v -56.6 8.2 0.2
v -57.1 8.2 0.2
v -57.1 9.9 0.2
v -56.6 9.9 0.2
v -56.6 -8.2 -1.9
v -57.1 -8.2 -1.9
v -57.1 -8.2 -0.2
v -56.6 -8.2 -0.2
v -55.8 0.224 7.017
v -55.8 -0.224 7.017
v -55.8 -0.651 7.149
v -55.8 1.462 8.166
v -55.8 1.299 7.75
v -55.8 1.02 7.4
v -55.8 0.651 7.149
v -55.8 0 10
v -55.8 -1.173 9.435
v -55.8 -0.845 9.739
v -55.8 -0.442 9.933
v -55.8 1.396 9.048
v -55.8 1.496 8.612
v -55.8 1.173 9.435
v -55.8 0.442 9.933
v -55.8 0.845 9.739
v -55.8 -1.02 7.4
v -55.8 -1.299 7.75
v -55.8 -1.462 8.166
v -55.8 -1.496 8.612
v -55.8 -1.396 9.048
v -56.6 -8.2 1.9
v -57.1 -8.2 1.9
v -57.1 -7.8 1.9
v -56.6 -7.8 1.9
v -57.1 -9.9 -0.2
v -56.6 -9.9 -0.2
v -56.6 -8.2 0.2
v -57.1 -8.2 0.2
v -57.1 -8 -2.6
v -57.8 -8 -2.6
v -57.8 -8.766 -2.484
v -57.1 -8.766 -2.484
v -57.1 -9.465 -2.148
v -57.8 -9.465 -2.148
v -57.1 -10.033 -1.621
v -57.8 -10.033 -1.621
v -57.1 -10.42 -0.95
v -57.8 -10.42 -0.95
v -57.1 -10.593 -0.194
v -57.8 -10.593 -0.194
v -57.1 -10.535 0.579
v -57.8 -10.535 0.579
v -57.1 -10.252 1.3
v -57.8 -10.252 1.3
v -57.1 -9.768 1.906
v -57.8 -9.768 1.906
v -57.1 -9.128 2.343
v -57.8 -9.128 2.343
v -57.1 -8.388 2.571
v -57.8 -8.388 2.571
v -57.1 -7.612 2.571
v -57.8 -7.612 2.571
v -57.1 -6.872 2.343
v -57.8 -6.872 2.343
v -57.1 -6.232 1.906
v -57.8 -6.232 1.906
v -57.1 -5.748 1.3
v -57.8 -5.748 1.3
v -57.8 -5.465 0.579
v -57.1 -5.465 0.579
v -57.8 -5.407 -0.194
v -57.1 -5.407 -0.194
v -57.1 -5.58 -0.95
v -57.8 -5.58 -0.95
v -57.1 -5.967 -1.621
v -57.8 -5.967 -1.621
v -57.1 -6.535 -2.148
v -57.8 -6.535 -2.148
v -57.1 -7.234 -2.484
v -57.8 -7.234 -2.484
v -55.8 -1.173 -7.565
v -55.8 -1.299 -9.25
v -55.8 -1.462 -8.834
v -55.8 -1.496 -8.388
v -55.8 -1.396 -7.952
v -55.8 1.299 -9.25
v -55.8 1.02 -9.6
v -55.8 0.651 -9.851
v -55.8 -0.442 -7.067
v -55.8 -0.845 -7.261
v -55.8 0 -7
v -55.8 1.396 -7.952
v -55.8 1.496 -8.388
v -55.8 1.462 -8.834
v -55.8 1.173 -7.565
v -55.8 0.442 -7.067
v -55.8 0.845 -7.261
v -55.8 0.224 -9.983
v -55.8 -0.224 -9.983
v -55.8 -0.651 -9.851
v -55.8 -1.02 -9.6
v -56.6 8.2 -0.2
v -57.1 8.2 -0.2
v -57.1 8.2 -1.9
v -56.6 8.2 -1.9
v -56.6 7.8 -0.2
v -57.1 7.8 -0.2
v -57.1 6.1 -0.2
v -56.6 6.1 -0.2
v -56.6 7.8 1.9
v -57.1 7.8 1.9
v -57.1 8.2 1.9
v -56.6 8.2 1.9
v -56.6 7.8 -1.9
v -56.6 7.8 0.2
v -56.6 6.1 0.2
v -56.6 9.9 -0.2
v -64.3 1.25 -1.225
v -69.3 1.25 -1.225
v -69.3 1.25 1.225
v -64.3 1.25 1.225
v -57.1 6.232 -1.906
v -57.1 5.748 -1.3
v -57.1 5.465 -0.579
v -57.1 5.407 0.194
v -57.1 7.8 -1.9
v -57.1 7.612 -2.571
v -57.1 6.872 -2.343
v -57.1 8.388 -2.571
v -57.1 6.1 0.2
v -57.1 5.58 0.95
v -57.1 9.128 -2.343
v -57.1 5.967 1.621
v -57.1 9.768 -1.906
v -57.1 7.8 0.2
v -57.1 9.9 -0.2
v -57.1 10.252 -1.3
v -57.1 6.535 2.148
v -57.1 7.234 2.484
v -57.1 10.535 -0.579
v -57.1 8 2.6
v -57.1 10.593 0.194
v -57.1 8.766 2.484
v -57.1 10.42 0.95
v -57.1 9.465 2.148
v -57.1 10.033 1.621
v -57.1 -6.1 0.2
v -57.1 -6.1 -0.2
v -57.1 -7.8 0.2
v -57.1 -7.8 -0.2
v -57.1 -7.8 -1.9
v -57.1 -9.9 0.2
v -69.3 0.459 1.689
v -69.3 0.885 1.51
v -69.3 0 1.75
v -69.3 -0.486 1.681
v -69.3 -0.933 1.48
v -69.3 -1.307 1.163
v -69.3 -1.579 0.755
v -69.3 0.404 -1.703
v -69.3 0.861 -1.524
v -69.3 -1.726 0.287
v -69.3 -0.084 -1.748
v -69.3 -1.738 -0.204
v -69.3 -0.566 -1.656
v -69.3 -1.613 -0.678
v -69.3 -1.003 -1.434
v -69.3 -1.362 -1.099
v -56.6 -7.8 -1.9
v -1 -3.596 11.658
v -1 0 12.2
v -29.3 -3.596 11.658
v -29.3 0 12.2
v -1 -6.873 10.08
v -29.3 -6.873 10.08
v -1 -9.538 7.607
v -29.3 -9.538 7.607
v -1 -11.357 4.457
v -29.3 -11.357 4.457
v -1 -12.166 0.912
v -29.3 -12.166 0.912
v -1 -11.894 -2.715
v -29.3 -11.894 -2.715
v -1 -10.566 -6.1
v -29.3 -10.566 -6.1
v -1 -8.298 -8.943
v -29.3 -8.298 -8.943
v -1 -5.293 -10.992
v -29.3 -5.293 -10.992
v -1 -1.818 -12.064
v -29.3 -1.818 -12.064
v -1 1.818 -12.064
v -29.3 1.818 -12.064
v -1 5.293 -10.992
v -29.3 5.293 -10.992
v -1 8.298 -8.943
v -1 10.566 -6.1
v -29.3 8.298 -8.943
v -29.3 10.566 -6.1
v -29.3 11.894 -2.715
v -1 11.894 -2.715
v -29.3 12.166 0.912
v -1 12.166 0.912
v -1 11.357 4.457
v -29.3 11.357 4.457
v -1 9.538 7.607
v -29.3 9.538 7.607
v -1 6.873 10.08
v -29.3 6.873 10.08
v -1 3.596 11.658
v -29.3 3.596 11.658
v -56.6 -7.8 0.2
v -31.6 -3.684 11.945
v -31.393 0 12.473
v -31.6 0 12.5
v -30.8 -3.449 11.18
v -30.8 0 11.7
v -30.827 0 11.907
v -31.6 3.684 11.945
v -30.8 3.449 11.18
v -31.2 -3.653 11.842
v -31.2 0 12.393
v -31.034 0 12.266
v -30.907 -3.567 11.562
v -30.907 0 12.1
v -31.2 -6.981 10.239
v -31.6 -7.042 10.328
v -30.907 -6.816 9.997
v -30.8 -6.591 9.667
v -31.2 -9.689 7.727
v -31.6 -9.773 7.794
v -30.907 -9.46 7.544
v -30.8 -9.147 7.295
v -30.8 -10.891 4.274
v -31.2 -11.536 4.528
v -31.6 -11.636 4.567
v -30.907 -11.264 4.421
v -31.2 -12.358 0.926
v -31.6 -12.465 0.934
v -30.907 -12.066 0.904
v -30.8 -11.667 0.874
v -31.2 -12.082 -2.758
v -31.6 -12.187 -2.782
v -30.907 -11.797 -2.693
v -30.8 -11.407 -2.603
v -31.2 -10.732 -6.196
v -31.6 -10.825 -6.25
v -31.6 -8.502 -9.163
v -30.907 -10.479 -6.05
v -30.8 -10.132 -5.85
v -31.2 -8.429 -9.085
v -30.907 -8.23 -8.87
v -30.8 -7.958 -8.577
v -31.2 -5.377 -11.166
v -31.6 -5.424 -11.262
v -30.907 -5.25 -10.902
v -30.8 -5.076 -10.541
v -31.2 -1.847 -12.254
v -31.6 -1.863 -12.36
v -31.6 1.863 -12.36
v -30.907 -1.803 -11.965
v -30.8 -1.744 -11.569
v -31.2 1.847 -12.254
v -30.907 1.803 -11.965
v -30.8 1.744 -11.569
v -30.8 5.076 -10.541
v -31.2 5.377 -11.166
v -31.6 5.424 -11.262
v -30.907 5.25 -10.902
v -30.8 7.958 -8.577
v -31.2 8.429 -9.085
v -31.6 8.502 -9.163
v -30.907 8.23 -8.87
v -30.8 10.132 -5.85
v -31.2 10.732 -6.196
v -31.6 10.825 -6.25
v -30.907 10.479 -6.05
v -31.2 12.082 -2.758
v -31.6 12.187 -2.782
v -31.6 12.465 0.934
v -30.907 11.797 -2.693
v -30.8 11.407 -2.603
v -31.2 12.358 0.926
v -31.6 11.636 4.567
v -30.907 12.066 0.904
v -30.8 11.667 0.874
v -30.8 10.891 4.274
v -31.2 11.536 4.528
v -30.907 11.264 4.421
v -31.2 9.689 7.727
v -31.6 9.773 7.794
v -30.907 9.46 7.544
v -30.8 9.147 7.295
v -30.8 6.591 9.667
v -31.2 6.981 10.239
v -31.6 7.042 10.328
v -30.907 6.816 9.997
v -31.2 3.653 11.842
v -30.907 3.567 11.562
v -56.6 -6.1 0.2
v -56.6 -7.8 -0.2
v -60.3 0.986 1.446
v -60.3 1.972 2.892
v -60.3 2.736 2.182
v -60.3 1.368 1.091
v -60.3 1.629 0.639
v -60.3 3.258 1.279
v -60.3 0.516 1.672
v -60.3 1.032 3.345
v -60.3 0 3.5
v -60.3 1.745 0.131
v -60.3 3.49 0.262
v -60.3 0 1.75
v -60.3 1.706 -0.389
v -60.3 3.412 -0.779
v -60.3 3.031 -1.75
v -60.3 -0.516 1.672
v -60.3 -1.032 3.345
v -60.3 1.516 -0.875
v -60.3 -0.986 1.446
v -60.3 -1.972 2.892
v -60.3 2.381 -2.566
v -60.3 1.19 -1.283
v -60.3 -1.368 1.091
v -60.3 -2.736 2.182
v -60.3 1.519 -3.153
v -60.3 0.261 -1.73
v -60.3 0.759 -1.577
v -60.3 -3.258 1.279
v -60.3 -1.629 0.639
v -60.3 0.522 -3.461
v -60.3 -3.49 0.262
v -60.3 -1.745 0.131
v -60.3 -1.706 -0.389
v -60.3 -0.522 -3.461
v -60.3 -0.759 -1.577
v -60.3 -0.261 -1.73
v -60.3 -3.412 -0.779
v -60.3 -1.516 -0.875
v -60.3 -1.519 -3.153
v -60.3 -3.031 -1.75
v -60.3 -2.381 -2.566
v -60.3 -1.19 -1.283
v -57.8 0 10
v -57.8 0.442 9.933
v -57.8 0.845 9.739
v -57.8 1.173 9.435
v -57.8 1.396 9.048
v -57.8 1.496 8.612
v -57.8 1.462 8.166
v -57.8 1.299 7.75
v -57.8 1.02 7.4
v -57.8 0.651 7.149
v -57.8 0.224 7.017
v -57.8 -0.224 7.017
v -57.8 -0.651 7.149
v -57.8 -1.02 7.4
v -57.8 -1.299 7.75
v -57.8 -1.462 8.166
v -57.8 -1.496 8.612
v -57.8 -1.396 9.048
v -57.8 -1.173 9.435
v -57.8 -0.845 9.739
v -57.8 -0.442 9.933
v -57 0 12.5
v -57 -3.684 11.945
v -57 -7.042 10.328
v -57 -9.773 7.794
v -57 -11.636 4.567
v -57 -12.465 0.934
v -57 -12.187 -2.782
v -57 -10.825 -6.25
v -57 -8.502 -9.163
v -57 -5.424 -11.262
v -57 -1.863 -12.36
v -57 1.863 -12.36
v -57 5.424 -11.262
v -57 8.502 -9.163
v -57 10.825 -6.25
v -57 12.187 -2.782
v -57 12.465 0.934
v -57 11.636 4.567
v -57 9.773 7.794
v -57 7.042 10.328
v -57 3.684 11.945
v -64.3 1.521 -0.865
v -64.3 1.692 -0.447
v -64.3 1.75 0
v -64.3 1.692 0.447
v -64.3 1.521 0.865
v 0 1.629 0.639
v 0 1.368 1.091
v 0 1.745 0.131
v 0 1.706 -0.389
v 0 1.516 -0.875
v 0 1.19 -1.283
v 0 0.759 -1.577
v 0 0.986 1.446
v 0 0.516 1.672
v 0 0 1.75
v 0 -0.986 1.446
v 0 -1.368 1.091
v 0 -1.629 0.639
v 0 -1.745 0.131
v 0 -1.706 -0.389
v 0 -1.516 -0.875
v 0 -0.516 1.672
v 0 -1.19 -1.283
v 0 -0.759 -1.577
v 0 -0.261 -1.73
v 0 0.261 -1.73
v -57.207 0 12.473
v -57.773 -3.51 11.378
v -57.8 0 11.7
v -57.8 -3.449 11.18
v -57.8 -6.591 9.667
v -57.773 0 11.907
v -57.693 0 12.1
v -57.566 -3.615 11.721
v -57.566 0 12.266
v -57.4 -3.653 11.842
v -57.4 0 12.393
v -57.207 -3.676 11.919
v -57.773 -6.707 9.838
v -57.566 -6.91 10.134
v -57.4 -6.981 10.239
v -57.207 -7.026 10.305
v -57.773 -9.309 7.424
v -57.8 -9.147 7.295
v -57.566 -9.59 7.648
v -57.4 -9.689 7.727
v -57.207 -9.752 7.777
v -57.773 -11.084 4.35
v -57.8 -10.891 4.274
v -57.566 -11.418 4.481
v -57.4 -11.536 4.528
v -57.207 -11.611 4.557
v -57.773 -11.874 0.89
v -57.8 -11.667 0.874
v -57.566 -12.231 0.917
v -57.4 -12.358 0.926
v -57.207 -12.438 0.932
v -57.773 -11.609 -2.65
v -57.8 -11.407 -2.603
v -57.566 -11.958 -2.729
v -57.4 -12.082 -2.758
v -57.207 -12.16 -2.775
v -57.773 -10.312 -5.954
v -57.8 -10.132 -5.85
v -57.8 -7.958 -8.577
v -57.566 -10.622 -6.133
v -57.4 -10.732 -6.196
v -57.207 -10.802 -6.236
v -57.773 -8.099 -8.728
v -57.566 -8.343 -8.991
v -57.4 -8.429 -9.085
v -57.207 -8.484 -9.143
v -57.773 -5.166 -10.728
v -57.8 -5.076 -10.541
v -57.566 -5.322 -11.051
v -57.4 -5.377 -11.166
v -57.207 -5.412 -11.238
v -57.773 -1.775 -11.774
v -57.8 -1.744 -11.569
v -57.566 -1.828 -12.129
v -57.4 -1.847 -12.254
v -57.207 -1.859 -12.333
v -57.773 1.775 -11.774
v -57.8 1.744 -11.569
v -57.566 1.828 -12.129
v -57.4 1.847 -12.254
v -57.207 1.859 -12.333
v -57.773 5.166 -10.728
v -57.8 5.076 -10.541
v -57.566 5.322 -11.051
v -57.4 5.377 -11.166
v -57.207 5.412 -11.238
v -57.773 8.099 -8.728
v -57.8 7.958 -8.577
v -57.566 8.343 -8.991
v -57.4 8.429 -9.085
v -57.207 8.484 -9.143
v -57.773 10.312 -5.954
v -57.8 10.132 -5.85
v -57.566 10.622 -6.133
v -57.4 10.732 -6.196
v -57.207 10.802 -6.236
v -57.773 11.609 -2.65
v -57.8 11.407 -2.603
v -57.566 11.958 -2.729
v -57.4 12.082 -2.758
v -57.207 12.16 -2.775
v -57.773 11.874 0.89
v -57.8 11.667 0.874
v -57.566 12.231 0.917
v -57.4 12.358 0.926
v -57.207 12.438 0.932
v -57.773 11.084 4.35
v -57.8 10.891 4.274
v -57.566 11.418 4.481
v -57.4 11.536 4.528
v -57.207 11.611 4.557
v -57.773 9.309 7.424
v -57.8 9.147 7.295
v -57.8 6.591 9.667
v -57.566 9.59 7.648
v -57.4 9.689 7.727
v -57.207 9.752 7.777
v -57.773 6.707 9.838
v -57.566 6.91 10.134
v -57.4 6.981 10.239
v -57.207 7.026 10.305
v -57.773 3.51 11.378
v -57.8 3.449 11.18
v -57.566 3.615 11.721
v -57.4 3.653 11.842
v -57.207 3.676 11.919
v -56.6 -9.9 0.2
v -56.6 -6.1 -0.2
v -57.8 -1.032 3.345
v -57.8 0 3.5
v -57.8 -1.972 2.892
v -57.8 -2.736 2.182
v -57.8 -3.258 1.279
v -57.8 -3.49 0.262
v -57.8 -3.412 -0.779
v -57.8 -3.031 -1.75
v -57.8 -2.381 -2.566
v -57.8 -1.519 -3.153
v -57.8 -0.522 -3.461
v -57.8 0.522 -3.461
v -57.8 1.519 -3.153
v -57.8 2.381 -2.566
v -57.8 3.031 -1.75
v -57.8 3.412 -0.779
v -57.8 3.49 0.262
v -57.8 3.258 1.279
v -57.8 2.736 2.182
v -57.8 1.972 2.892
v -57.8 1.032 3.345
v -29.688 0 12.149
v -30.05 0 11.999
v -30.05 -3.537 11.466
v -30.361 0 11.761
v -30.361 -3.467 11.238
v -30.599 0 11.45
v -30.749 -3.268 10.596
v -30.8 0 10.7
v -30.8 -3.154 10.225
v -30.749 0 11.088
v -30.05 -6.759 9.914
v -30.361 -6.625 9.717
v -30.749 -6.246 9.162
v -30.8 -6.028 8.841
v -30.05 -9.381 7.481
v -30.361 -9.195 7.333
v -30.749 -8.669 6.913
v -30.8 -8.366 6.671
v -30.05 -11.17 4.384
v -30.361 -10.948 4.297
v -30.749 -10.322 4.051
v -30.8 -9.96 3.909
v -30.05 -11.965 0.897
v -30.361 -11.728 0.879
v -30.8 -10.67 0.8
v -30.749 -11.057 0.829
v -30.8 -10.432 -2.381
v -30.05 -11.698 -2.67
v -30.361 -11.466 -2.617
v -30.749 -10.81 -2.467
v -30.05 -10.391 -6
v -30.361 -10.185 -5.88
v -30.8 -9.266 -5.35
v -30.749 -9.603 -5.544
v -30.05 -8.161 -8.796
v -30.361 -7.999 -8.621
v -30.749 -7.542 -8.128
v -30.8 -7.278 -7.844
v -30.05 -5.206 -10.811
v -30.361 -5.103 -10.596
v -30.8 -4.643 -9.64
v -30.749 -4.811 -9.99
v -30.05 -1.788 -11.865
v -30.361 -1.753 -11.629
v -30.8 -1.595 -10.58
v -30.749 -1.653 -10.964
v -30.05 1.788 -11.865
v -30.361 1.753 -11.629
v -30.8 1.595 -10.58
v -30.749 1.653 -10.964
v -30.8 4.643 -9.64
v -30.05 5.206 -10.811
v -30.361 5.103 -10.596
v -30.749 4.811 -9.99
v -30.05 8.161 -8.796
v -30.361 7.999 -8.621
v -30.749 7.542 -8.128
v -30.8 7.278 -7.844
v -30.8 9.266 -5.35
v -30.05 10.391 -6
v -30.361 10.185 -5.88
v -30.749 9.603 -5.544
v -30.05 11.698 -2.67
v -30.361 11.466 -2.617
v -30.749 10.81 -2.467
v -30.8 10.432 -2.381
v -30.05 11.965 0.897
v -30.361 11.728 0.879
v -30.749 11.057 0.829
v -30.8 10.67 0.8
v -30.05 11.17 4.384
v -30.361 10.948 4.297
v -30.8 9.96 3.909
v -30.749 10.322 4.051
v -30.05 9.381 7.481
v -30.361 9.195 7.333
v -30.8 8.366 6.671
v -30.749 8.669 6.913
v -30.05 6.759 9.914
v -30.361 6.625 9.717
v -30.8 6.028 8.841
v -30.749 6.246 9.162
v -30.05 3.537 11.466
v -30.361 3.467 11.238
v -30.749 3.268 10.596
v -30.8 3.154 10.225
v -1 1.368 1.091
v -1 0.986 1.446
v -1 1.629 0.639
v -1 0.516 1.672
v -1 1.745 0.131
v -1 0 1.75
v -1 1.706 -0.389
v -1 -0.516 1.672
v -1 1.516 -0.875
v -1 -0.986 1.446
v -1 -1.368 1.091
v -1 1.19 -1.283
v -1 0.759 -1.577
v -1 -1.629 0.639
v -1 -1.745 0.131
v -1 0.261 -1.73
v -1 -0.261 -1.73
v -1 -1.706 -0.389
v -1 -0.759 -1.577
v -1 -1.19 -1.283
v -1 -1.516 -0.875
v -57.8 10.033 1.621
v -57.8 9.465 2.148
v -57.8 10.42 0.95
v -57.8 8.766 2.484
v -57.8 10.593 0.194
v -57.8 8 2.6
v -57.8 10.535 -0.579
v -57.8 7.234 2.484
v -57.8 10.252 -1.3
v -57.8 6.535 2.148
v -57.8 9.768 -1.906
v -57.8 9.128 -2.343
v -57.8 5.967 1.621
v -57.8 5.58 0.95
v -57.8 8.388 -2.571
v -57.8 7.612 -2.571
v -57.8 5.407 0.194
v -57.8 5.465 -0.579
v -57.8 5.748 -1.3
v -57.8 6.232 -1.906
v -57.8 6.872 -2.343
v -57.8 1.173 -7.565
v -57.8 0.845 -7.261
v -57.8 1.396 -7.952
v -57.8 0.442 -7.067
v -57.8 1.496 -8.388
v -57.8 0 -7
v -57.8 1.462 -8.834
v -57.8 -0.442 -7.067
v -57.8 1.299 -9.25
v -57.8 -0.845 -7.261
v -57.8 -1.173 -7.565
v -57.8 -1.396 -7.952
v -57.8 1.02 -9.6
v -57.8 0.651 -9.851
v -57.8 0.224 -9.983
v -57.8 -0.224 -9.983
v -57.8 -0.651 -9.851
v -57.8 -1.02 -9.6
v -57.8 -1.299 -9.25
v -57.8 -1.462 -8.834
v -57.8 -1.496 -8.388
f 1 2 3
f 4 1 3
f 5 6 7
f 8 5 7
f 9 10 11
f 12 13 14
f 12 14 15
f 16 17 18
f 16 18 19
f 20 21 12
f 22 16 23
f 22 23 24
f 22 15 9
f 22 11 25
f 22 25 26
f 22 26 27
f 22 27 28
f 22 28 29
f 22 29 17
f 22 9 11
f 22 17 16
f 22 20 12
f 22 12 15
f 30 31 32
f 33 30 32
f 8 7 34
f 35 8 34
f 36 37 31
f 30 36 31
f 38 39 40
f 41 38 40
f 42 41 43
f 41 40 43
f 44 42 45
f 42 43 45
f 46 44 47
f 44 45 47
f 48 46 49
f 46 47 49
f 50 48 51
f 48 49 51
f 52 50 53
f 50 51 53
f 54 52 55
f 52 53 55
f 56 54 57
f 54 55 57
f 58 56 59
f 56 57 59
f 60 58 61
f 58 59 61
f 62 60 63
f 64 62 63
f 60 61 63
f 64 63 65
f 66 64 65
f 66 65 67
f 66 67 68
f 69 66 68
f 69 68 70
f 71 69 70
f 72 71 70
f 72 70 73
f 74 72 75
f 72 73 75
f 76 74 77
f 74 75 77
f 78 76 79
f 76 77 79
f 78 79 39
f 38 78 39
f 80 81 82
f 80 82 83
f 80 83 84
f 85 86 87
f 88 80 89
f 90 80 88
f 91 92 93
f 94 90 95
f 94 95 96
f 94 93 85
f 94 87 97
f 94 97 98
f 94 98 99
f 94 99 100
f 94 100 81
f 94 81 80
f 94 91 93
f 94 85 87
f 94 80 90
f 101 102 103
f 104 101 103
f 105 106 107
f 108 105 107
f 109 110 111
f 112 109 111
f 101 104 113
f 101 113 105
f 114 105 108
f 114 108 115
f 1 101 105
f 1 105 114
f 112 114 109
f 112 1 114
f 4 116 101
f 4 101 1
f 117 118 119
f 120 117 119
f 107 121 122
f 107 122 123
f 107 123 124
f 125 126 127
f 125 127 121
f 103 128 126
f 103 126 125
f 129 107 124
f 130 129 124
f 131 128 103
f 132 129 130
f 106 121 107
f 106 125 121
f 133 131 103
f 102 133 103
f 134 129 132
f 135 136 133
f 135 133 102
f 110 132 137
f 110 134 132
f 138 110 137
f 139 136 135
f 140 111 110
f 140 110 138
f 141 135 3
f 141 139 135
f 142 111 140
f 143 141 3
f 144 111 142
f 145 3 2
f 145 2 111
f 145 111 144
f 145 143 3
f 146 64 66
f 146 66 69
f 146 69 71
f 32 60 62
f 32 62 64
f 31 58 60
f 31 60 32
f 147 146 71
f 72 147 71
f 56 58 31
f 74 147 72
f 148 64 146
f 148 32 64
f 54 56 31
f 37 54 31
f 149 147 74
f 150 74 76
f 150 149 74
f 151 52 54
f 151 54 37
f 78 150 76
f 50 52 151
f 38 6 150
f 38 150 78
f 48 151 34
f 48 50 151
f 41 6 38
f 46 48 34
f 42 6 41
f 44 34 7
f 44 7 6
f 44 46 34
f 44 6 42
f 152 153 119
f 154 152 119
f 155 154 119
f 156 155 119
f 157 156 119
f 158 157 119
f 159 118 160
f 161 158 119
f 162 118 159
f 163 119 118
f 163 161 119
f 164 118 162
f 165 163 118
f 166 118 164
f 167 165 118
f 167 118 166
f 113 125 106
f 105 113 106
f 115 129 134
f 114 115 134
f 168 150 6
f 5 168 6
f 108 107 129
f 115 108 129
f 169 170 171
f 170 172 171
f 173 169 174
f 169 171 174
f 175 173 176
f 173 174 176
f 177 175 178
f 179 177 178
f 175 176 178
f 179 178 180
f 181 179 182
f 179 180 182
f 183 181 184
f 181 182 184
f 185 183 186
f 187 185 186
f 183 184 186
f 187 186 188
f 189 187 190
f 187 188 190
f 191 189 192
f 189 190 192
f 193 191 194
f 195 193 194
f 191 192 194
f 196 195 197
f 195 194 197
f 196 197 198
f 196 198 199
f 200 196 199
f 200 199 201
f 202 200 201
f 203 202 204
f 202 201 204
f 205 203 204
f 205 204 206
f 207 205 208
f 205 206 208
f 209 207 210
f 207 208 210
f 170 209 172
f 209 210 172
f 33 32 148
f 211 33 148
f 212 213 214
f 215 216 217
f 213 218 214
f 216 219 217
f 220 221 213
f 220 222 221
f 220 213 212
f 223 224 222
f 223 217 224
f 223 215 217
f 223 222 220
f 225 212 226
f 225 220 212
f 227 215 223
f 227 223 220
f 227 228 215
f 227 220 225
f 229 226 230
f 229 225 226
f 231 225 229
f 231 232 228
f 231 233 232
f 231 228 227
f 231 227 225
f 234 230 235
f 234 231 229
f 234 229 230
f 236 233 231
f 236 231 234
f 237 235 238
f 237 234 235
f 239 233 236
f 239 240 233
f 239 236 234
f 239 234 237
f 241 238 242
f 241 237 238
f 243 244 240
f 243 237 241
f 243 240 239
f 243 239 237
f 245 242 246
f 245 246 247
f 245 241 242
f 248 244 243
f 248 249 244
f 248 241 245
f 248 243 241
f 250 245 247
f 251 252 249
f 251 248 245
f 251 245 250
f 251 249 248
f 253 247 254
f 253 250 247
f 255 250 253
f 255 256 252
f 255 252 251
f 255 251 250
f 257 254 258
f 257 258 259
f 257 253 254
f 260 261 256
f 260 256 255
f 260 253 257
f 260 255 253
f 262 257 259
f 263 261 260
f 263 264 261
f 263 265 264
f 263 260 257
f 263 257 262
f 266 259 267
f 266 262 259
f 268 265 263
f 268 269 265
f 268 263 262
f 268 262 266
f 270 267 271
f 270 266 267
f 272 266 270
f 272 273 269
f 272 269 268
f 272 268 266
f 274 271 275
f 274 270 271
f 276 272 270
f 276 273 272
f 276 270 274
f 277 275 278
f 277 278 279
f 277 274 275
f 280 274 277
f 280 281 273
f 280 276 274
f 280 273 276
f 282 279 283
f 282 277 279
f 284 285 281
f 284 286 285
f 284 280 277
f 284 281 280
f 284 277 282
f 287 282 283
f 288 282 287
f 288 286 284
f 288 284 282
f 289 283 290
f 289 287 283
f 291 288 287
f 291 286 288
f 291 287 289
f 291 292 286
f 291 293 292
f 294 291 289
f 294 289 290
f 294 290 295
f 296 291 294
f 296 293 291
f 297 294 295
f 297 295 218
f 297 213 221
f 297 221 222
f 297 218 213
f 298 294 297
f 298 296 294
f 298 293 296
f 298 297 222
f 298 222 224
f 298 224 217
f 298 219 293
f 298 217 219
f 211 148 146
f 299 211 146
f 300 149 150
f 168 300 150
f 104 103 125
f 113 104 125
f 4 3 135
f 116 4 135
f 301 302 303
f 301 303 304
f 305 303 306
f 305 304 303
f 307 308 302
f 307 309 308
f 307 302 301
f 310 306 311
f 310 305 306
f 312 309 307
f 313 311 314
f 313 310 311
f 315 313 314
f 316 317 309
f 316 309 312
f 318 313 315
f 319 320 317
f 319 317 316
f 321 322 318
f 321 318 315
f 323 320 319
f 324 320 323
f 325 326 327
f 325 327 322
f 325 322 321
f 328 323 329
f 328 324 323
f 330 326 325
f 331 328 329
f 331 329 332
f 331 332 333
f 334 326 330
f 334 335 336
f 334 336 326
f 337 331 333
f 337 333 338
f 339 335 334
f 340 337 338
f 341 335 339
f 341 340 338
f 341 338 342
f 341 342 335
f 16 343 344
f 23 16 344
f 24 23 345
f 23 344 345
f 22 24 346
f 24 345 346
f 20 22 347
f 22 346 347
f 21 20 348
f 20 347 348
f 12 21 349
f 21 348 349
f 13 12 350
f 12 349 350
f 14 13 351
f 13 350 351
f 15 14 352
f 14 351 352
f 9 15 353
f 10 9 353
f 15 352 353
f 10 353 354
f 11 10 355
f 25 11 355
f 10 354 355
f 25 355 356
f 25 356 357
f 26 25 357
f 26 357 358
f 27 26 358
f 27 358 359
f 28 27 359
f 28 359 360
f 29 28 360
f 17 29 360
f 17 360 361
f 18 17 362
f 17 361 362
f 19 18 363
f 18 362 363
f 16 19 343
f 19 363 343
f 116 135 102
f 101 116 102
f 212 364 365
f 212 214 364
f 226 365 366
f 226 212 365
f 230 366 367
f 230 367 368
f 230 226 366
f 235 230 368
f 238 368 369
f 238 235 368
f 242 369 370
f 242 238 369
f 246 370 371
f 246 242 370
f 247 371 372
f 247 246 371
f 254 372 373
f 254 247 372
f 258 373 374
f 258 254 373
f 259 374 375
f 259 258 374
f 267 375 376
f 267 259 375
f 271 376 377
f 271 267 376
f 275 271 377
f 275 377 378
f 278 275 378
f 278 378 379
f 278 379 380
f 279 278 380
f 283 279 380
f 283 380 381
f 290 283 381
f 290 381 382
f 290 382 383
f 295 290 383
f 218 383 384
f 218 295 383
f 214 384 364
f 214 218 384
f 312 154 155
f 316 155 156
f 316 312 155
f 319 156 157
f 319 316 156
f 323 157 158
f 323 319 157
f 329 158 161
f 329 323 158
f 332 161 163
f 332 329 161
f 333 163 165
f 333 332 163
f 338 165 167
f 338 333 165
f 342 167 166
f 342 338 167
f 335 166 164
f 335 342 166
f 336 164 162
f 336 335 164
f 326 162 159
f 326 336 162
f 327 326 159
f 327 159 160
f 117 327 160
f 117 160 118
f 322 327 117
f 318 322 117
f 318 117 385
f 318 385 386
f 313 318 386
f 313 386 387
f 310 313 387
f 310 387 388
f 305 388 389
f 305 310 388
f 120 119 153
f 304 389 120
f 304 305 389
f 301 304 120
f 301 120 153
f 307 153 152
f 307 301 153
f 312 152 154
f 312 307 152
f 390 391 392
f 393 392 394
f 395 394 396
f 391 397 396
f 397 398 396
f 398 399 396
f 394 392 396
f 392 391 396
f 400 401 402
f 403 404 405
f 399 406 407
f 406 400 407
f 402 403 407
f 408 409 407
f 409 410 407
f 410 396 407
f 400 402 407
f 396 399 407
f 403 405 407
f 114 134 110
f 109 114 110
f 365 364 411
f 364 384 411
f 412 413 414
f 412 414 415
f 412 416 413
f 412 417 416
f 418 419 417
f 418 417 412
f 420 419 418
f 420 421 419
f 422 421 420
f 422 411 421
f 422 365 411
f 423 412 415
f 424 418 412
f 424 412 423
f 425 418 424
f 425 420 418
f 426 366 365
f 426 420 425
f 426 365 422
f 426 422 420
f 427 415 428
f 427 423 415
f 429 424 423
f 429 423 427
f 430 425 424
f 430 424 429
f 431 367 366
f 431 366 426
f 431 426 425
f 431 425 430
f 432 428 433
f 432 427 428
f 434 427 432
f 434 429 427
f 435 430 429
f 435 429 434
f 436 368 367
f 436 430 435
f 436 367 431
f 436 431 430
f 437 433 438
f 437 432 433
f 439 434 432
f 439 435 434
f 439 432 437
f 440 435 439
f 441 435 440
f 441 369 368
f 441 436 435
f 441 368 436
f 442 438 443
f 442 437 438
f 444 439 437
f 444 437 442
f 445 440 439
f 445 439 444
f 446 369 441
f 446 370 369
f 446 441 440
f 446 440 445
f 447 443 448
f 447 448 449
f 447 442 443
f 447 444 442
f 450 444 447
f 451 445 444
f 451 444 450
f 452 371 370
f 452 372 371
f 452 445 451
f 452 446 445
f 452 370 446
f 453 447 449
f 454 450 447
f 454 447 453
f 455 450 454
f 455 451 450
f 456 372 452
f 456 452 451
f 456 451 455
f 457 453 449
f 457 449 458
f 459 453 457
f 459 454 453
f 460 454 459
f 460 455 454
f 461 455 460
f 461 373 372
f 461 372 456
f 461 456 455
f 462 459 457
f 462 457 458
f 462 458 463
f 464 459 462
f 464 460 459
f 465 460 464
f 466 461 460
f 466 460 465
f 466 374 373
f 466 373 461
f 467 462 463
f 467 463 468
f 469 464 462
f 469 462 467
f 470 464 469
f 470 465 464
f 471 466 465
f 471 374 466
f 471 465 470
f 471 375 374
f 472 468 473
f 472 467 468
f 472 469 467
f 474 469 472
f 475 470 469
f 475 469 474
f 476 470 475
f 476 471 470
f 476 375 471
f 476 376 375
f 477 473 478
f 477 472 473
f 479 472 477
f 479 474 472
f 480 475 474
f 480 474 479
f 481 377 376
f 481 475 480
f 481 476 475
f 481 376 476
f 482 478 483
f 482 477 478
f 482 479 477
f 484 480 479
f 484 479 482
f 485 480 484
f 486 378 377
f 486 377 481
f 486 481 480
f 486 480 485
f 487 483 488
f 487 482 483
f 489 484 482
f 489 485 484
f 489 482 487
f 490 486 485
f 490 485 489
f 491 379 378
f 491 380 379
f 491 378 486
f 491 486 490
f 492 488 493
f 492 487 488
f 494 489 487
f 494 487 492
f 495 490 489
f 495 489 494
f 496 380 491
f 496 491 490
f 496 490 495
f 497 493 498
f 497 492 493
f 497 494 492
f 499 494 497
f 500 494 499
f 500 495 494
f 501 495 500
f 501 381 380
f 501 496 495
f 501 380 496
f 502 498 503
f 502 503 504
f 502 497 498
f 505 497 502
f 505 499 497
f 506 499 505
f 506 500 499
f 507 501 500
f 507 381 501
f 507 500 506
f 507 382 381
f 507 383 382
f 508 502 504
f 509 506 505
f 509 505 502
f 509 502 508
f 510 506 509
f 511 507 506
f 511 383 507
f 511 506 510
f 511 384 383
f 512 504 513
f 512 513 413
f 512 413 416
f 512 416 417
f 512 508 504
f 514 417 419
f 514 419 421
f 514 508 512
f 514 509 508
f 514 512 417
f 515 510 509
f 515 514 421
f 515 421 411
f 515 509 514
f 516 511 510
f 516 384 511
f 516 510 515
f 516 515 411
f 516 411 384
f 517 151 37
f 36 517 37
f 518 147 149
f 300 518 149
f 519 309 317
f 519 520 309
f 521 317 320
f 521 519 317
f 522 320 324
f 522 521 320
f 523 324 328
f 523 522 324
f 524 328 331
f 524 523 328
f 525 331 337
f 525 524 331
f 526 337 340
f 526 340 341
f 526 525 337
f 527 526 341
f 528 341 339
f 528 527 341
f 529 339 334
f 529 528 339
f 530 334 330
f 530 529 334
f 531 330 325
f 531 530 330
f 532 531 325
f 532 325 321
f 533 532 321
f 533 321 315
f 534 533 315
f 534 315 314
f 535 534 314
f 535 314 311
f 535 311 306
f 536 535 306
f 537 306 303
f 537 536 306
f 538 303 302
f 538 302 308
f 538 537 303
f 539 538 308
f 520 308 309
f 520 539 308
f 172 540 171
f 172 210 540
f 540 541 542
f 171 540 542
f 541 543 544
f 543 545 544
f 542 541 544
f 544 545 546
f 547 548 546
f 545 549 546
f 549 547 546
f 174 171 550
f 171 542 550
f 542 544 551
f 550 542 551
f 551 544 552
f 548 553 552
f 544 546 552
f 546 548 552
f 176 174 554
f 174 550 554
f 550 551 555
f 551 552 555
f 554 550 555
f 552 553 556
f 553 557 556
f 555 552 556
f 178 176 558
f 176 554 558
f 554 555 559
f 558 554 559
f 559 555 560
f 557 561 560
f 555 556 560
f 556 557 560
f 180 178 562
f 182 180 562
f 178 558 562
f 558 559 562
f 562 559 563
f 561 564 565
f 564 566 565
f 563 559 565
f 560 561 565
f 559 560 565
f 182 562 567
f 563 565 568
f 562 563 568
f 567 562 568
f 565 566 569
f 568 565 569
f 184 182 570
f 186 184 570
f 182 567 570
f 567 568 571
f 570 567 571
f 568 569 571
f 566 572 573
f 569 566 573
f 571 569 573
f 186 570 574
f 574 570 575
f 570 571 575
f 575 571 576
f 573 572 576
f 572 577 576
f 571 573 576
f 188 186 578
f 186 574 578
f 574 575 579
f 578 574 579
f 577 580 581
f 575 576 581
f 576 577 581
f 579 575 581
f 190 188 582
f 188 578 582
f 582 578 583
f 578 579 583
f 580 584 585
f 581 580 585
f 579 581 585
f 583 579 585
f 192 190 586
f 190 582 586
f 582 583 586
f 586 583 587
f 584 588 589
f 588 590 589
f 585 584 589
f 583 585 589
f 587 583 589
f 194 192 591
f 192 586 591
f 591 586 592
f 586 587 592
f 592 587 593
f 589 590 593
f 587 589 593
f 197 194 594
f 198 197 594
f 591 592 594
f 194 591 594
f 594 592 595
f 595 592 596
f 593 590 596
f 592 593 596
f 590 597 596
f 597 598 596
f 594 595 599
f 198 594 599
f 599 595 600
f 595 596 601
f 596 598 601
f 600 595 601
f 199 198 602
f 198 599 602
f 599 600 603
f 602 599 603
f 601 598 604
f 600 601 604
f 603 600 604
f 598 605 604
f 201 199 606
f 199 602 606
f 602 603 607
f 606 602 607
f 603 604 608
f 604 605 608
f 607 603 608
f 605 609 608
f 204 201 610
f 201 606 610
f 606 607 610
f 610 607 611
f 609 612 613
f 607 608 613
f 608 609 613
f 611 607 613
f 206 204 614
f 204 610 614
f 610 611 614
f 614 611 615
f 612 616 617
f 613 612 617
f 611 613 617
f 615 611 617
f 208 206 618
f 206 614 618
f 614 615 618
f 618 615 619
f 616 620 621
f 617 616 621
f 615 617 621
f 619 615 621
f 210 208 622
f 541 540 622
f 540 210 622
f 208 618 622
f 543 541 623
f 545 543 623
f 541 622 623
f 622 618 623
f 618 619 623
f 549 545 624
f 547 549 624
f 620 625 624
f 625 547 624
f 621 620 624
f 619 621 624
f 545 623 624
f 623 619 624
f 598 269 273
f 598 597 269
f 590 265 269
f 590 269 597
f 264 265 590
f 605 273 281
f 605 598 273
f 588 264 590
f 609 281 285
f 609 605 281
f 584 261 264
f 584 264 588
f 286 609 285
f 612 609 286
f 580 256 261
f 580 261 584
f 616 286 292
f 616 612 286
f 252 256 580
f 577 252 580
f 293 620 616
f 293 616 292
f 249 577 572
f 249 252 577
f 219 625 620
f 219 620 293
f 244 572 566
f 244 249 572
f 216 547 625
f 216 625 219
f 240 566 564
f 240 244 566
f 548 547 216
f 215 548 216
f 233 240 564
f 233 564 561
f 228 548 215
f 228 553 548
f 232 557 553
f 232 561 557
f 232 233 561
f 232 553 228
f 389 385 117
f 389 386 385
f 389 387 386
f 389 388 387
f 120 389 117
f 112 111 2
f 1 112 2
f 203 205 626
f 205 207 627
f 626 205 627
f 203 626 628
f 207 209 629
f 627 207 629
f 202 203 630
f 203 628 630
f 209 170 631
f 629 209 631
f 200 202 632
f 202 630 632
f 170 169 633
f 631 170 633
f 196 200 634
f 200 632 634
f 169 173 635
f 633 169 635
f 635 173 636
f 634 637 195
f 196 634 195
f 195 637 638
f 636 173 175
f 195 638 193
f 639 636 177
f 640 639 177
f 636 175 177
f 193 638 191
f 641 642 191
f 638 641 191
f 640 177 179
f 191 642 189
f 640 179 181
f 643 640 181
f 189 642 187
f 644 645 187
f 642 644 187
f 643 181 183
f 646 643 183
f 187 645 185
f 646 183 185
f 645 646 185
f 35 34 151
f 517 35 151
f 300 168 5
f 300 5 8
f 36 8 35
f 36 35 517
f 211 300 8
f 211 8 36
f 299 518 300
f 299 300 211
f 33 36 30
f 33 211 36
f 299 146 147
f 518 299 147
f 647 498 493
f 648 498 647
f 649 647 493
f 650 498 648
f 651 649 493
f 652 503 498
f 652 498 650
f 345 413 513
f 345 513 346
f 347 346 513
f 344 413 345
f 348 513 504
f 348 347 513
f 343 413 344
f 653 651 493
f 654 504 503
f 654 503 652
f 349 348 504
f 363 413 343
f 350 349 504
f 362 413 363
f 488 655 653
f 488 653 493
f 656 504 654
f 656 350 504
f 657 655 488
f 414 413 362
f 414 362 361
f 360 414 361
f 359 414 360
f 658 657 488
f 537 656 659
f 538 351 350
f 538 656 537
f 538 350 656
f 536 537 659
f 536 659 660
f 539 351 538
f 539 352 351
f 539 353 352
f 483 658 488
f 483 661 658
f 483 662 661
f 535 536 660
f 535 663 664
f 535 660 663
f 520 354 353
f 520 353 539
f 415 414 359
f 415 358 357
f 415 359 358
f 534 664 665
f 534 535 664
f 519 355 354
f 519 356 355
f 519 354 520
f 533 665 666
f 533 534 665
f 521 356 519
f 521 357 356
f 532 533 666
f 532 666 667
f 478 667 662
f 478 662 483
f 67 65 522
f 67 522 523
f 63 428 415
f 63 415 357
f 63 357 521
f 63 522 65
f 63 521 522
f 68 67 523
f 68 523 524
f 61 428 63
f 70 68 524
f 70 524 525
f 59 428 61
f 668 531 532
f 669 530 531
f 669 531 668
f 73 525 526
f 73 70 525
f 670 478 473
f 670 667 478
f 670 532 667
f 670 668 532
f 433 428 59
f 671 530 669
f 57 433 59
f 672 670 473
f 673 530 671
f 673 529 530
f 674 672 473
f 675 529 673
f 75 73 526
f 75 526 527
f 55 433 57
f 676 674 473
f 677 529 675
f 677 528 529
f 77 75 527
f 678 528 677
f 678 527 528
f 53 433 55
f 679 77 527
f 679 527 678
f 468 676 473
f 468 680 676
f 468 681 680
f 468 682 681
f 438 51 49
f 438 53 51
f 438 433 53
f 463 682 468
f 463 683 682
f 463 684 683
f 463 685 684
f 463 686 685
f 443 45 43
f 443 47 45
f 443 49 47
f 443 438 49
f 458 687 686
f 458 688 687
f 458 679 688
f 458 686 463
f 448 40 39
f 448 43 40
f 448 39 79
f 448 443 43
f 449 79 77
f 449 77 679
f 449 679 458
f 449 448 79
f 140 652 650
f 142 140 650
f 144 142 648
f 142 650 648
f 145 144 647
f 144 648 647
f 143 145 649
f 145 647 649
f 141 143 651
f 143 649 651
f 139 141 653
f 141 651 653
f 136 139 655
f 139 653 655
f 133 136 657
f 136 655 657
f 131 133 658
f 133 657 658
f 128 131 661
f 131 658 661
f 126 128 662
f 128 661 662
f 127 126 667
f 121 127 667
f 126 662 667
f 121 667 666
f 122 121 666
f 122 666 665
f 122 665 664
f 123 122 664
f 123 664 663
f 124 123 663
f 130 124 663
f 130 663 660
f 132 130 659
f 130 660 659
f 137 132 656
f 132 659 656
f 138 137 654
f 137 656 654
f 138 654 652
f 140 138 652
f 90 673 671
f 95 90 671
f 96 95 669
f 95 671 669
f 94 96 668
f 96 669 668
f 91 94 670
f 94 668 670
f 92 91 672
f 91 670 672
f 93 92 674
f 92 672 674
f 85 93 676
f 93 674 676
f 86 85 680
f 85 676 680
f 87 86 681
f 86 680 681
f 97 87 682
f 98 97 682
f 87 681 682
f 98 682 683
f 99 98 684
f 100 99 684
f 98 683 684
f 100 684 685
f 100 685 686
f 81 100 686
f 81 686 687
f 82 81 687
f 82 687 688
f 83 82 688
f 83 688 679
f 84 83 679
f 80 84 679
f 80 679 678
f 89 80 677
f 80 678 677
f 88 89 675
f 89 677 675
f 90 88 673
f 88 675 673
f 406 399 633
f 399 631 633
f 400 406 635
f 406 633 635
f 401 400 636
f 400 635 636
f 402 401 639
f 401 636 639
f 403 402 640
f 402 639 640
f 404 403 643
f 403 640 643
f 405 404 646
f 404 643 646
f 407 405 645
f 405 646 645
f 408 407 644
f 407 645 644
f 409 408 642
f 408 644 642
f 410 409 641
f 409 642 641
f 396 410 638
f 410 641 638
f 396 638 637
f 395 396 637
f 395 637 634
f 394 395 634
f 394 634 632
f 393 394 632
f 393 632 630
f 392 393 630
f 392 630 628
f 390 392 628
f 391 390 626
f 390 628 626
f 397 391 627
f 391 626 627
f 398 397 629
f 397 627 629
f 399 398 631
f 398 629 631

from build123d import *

# Parameters (mm, degrees)
CROQUIS3_W            = 2.449489742
CROQUIS3_H            = 1
CORTAR_EXTRUIR1_DEPTH = 5
CROQUIS4_R            = 1.5
CORTAR_EXTRUIR2_DEPTH = 2
CROQUIS6_R            = 2.6
CORTAR_EXTRUIR3_DEPTH = 0.7
CORTAR_EXTRUIR4_DEPTH = 0.5


with BuildPart() as part:
    # Croquis1 → Revolución1 (revolve)
    with BuildSketch(Plane.XY, mode=Mode.PRIVATE) as revoluci_n1_sk:
        with BuildLine():
            Line((0, 0), (0, 1.75))
            Line((0, 1.75), (-1, 1.75))
            Line((-1, 1.75), (-1, 12.2))
            Line((-1, 12.2), (-29.3, 12.2))
            ThreePointArc((-29.3, 12.2), (-30.360660172, 11.760660172), (-30.8, 10.7))
            Line((-30.8, 10.7), (-30.8, 0))
            Line((-30.8, 0), (0, 0))
        make_face()
    revolve(revoluci_n1_sk.sketch.rotate(Axis((-226.683028939, 0, 0), (1, 0, 0)), 90), axis=Axis((-226.683028939, 0, 0), (1, 0, 0)))

    # Croquis2 → Revolución2 (revolve)
    with BuildSketch(Plane.XY, mode=Mode.PRIVATE) as revoluci_n2_sk:
        with BuildLine():
            Line((-57, 12.5), (-31.6, 12.5))
            ThreePointArc((-31.6, 12.5), (-31.034314575, 12.265685425), (-30.8, 11.7))
            Line((-30.8, 11.7), (-30.8, 0))
            Line((-30.8, 0), (-69.3, 0))
            Line((-69.3, 0), (-69.3, 1.75))
            Line((-69.3, 1.75), (-60.3, 1.75))
            Line((-60.3, 1.75), (-60.3, 3.5))
            Line((-60.3, 3.5), (-57.8, 3.5))
            Line((-57.8, 3.5), (-57.8, 11.7))
            ThreePointArc((-57.8, 11.7), (-57.565685425, 12.265685425), (-57, 12.5))
        make_face()
    revolve(revoluci_n2_sk.sketch.rotate(Axis((-1000, 0, 0), (1, 0, 0)), 90), axis=Axis((-1000, 0, 0), (1, 0, 0)))

    # Croquis3 → Cortar-Extruir1 (cut)
    with BuildSketch(Plane.ZY.offset(69.3)):
        with Locations((0, 1.75)):
            Rectangle(CROQUIS3_W, CROQUIS3_H)
    extrude(amount=-CORTAR_EXTRUIR1_DEPTH, mode=Mode.SUBTRACT)

    # Croquis4 → Cortar-Extruir2 (cut)
    with BuildSketch(Plane.ZY.offset(57.8)):
        with Locations((-8.5, 0)):
            Circle(CROQUIS4_R)
        with Locations((8.5, 0)):
            Circle(CROQUIS4_R)
    extrude(amount=-CORTAR_EXTRUIR2_DEPTH, mode=Mode.SUBTRACT)

    # Croquis6 → Cortar-Extruir3 (cut)
    with BuildSketch(Plane.ZY.offset(57.8)):
        with Locations((0, 8)):
            Circle(CROQUIS6_R)
        with Locations(Location((0, -8, 0), (0, 0, 180))):
            Circle(CROQUIS6_R)
    extrude(amount=-CORTAR_EXTRUIR3_DEPTH, mode=Mode.SUBTRACT)

    # Croquis7 → Cortar-Extruir4 (cut)
    with BuildSketch(Plane.ZY.offset(57.1)):
        Polygon((0.2, 9.9), (-0.2, 9.9), (-0.2, 8.2), (-1.9, 8.2), (-1.9, 7.8), (-0.2, 7.8), (-0.2, 6.1), (0.2, 6.1), (0.2, 7.8), (1.9, 7.8), (1.9, 8.2), (0.2, 8.2), align=None)
        Polygon((-0.2, -7.8), (-1.9, -7.8), (-1.9, -8.2), (-0.2, -8.2), (-0.2, -9.9), (0.2, -9.9), (0.2, -8.2), (1.9, -8.2), (1.9, -7.8), (0.2, -7.8), (0.2, -6.1), (-0.2, -6.1), align=None)
    extrude(amount=-CORTAR_EXTRUIR4_DEPTH, mode=Mode.SUBTRACT)


solid = part.part
